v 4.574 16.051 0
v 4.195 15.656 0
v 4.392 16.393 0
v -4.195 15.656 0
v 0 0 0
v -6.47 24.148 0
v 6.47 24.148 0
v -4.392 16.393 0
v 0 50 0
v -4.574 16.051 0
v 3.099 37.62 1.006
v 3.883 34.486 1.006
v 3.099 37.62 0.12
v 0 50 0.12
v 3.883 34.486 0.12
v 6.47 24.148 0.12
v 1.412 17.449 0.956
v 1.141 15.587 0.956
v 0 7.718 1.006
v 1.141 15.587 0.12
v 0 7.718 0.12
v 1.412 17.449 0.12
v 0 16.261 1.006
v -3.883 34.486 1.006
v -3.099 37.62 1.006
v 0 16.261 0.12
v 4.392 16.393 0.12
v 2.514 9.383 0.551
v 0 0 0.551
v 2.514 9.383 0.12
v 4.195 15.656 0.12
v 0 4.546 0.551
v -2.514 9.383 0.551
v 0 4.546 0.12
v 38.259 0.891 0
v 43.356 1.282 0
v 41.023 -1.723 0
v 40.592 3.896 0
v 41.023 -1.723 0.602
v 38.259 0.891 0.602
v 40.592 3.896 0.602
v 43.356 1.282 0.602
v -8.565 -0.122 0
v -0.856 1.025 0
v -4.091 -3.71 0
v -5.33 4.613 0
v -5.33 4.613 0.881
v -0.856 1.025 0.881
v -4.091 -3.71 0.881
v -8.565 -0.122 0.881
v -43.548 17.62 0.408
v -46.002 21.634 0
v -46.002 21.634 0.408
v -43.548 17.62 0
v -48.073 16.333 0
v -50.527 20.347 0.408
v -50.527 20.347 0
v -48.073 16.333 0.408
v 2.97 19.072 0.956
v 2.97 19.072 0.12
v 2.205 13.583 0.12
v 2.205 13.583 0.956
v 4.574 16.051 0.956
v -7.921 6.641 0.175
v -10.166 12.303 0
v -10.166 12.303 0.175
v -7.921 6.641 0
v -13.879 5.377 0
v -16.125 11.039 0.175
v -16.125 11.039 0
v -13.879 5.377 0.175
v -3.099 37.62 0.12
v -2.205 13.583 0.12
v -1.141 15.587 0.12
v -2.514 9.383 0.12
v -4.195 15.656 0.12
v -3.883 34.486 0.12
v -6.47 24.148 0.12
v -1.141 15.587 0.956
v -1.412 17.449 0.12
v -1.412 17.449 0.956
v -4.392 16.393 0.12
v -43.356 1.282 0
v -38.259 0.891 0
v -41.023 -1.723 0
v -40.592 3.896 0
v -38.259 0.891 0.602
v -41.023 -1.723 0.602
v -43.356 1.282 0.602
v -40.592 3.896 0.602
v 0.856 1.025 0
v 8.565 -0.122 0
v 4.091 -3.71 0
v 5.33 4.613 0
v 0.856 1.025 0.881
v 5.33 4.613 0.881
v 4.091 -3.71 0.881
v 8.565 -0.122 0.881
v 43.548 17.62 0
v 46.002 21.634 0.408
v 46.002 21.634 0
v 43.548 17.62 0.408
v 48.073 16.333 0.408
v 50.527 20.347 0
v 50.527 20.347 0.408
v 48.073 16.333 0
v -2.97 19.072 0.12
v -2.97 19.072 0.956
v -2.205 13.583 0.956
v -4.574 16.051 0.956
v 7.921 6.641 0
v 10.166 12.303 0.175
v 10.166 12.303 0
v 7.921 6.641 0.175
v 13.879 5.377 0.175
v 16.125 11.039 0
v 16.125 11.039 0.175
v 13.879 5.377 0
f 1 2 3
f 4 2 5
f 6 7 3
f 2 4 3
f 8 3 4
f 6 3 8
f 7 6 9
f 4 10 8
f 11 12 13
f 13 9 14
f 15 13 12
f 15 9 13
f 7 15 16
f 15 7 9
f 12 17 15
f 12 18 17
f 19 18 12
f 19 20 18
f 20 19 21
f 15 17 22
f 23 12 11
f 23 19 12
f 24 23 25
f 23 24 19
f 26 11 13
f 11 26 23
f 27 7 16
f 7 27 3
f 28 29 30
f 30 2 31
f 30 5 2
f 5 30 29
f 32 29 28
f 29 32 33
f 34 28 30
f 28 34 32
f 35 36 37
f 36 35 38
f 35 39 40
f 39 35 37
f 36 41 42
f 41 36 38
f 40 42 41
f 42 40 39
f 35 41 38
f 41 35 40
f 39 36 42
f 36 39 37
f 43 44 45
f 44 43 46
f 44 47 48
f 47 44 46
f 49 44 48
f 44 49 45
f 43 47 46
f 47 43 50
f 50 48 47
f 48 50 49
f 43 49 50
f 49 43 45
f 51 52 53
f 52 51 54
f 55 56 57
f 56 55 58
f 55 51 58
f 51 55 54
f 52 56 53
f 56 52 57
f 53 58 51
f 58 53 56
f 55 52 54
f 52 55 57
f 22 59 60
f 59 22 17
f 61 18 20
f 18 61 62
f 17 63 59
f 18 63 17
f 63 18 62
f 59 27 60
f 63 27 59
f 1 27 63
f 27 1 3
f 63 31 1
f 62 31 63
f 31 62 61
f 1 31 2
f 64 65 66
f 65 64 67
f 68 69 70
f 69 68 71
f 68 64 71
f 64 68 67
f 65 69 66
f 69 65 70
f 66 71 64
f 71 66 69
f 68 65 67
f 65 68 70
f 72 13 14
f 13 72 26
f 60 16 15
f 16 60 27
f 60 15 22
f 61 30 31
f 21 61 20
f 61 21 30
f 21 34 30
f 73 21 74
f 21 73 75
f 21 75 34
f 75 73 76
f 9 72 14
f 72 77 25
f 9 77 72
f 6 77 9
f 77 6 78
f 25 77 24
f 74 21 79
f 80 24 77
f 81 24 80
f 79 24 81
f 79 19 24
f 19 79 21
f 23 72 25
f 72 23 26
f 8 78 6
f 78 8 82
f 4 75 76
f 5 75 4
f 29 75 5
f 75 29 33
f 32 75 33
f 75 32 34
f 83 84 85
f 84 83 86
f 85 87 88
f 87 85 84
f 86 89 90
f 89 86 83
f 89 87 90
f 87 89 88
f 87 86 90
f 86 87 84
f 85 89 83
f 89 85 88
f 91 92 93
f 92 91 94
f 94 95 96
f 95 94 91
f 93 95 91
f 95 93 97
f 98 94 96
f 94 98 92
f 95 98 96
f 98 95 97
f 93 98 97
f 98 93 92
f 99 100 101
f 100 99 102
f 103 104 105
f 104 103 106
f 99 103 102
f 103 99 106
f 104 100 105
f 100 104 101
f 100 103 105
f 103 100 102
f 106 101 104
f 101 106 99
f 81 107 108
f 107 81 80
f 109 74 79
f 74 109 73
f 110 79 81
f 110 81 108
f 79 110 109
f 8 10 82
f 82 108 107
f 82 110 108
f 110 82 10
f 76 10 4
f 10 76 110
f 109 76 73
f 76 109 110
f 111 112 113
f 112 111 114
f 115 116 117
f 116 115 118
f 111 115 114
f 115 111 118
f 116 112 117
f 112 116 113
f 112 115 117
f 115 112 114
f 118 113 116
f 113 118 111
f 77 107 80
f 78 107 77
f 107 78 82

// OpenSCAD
/**
 * Star Generator
 *      
 * Author: Jonas Frey  
 * Version: 0.1
 *
 * Description:
 * This OpenSCAD script generates a star-shaped 3D model with randomized 
 * decorative lines on each star corner.
 *
 * License:
 * This script licensed under a Standard Digital File License.
 *
 * Changelog:
 * [v1.0] Initial release
 */

// in mm
diameter = 100; // [10:400]
star_radius = diameter/2;
corners = 6;
star_corners = corners;
max_rand_angle = 360/star_corners;
layerheight = 0.12;
//change this number to get a different random pattern
randomseed = 42; // [0:0.1:100]
seed = randomseed;
generate_hole = true;  // [true, false]

// base triangle points
// Control the third point position

/* [Advanced] */
center_translation = -20;

angle1_max = 360/star_corners;  // Maximum angle for this star corner
anglefactor = 0.5;
p2_angle_factor = anglefactor;
p2_angle = angle1_max / 2 * p2_angle_factor;       // Angle for the third point (half of max angle)
radiusfactor = 0.5;
p2_radius_factor = radiusfactor;
p2_radius = star_radius * p2_radius_factor;   // Distance from origin (adjustable)

p2x = p2_radius * sin(p2_angle);  // x position (sin for angle from y-axis)
p2y = p2_radius * cos(p2_angle);  // y position (cos for angle from y-axis)

points = [[0,0], [0,star_radius], [p2x, p2y]];
faces = [[0,1,2]];
min_thick_lines = 0.5;
max_thick_lines = 3;
number_of_random_lines = 0;//3;
number_of_random_diamonds = 5;

// Generate random rhombi parameters
min_rhombus_width = 3;
max_rhombus_width = 10;
min_rhombus_length = 3;
max_rhombus_length = 10;


// small layerheight part1
module part1() {
    linear_extrude(height = layerheight)
        polygon(points = points, paths = faces);
}

// big layerheight part2 (used for intersections)
module part2() {
    linear_extrude(height = layerheight*20)
        polygon(points = points, paths = faces);
}

// Generate random line parameters
lines = [ for(i=[0:number_of_random_lines-1]) 
            let(
                w = rands(min_thick_lines, max_thick_lines, 1)[0], //rands(1,6,1,seed+i)[0],   // random width
                h = star_radius*2, // rands(2,6,1,seed+i+10)[0],// random height
                angle = rands(0,-max_rand_angle,1,seed+i+20)[0], // random rotation
                x_pos = 0,//rands(-5,5,1,seed+i+30)[0], // random X position
                y_pos = rands(0,star_radius/2,1,seed+i+40)[0], // random Y position
                layerheight = rands(layerheight, layerheight*10, 1)[0]
            )
            [w, h, angle, x_pos, y_pos, layerheight]  // store parameters as data
        ];


rhombi = [ for(i=[0:number_of_random_diamonds-1])
            let(
                width = rands(min_rhombus_width, max_rhombus_width, 1, seed+i+100)[0],
                length = rands(min_rhombus_length, max_rhombus_length, 1, seed+i+110)[0],
                angle = rands(0, 360, 1, seed+i+120)[0],
                x_pos = rands(0, p2x, 1)[0],
                y_pos = rands(0, star_radius, 1)[0],
                layerheight = rands(layerheight, layerheight*10, 1, seed+i+140)[0]
            )
            [width, length, angle, x_pos, y_pos, layerheight]  // store parameters as data
        ];

// Lines as objects
module lines() {
    for(r = lines)
        // Generate geometry from stored parameters
        translate([r[3], r[4], 0])       // x_pos, y_pos
            rotate([0,0,r[2]])           // angle
                translate([-r[0]/2,-r[1]/2,0])   // center using w, h
                    cube([r[0],r[1],r[5]]);         // w, h, height
}



// Module to create a rhombus pointing from origin along Y axis
module rhombus(w, l) {
    rhombus_points = [
        [0, 0],
        [-w/2, l/2],
        [0, l],
        [w/2, l/2]
    ];
    polygon(points = rhombus_points, paths = [[0,1,2,3]]);
}

// Single star corner module
module star_corner() {
    union() {
        part1();
        
        // Each line intersection gets a different color
        for(i = [0:len(lines)-1]) {
            let(
                r = lines[i],
                // Generate colors based on index
                hue = (i * 360 / len(lines)) % 360,
                color_rgb = [hue/360, 0.7, 0.9]  // HSV-like color generation
            )
            color(color_rgb)
                intersection() {
                    part2();
                    // Individual line
                    translate([r[3], r[4], 0])
                        rotate([0,0,r[2]])
                            translate([-r[0]/2,-r[1]/2,0])
                                cube([r[0],r[1],r[5]]);
                }
        }
        
        // Each rhombus intersection gets a different color
        for(i = [0:len(rhombi)-1]) {
            let(
                d = rhombi[i],
                // Generate colors based on index (offset from lines)
                hue = ((i + len(lines)) * 360 / (len(lines) + len(rhombi))) % 360,
                color_rgb = [hue/360, 0.7, 0.9]
            )
            color(color_rgb)
                // intersection() {
                //    part2();
                    // Individual rhombus
                    rotate([0, 0, d[2]])
                        translate([d[3], d[4], 0])
                            linear_extrude(height = d[5]) {
                                rhombus(d[0], d[1]);
                            }
                // }
        }
        
        // Uncomment the line below to show full cubes (and comment out intersection above)
        //for(i = [0:len(lines)-1]) {
        //    let(r = lines[i], hue = (i * 360 / len(lines)) % 360)
        //    color([hue/360, 0.7, 0.9])
        //        translate([r[3], r[4], 0])
        //            rotate([0,0,r[2]])
        //                translate([-r[0]/2,-r[1]/2,0])
        //                    cube([r[0],r[1],r[5]]);
        //}
    }
}

// Cylinder hole parameters
hole_outer_radius = 2;
hole_inner_radius = 1;
hole_length = 2;

// Module for the cylinder with a hole (tube)
module cylinder_hole() {
    difference() {
        // Create the tube
        difference() {
            cylinder(h = hole_length, r = hole_outer_radius, center = true);
            cylinder(h = hole_length + 1, r = hole_inner_radius, center = true);
        }
        // Cut away everything below the XY plane (Z < 0)
        tempvar = hole_outer_radius*5;
        translate([tempvar/2, 0, 0])
            cube([tempvar, tempvar, tempvar], center = true);
    }

}

// Complete star: circular pattern of mirrored corners
// for(i = [0:star_corners-1]) {
//     rotate([0, 0, i * 360/star_corners])
//         translate([0, center_translation, 0])  // translate leaf outward from center
            union() {
                star_corner();
                mirror([1, 0, 0])
                    star_corner();
            }
// }


// // Add the cylinder hole at the top peak of the first leaf (if enabled)
// if (generate_hole) {
//     translate([0, star_radius + center_translation-hole_outer_radius*4, 0])  // Position at top of first leaf
//         rotate([0, 90, 0])  // Rotate 90 degrees around Y axis to align with X axis
//             cylinder_hole();
// }
